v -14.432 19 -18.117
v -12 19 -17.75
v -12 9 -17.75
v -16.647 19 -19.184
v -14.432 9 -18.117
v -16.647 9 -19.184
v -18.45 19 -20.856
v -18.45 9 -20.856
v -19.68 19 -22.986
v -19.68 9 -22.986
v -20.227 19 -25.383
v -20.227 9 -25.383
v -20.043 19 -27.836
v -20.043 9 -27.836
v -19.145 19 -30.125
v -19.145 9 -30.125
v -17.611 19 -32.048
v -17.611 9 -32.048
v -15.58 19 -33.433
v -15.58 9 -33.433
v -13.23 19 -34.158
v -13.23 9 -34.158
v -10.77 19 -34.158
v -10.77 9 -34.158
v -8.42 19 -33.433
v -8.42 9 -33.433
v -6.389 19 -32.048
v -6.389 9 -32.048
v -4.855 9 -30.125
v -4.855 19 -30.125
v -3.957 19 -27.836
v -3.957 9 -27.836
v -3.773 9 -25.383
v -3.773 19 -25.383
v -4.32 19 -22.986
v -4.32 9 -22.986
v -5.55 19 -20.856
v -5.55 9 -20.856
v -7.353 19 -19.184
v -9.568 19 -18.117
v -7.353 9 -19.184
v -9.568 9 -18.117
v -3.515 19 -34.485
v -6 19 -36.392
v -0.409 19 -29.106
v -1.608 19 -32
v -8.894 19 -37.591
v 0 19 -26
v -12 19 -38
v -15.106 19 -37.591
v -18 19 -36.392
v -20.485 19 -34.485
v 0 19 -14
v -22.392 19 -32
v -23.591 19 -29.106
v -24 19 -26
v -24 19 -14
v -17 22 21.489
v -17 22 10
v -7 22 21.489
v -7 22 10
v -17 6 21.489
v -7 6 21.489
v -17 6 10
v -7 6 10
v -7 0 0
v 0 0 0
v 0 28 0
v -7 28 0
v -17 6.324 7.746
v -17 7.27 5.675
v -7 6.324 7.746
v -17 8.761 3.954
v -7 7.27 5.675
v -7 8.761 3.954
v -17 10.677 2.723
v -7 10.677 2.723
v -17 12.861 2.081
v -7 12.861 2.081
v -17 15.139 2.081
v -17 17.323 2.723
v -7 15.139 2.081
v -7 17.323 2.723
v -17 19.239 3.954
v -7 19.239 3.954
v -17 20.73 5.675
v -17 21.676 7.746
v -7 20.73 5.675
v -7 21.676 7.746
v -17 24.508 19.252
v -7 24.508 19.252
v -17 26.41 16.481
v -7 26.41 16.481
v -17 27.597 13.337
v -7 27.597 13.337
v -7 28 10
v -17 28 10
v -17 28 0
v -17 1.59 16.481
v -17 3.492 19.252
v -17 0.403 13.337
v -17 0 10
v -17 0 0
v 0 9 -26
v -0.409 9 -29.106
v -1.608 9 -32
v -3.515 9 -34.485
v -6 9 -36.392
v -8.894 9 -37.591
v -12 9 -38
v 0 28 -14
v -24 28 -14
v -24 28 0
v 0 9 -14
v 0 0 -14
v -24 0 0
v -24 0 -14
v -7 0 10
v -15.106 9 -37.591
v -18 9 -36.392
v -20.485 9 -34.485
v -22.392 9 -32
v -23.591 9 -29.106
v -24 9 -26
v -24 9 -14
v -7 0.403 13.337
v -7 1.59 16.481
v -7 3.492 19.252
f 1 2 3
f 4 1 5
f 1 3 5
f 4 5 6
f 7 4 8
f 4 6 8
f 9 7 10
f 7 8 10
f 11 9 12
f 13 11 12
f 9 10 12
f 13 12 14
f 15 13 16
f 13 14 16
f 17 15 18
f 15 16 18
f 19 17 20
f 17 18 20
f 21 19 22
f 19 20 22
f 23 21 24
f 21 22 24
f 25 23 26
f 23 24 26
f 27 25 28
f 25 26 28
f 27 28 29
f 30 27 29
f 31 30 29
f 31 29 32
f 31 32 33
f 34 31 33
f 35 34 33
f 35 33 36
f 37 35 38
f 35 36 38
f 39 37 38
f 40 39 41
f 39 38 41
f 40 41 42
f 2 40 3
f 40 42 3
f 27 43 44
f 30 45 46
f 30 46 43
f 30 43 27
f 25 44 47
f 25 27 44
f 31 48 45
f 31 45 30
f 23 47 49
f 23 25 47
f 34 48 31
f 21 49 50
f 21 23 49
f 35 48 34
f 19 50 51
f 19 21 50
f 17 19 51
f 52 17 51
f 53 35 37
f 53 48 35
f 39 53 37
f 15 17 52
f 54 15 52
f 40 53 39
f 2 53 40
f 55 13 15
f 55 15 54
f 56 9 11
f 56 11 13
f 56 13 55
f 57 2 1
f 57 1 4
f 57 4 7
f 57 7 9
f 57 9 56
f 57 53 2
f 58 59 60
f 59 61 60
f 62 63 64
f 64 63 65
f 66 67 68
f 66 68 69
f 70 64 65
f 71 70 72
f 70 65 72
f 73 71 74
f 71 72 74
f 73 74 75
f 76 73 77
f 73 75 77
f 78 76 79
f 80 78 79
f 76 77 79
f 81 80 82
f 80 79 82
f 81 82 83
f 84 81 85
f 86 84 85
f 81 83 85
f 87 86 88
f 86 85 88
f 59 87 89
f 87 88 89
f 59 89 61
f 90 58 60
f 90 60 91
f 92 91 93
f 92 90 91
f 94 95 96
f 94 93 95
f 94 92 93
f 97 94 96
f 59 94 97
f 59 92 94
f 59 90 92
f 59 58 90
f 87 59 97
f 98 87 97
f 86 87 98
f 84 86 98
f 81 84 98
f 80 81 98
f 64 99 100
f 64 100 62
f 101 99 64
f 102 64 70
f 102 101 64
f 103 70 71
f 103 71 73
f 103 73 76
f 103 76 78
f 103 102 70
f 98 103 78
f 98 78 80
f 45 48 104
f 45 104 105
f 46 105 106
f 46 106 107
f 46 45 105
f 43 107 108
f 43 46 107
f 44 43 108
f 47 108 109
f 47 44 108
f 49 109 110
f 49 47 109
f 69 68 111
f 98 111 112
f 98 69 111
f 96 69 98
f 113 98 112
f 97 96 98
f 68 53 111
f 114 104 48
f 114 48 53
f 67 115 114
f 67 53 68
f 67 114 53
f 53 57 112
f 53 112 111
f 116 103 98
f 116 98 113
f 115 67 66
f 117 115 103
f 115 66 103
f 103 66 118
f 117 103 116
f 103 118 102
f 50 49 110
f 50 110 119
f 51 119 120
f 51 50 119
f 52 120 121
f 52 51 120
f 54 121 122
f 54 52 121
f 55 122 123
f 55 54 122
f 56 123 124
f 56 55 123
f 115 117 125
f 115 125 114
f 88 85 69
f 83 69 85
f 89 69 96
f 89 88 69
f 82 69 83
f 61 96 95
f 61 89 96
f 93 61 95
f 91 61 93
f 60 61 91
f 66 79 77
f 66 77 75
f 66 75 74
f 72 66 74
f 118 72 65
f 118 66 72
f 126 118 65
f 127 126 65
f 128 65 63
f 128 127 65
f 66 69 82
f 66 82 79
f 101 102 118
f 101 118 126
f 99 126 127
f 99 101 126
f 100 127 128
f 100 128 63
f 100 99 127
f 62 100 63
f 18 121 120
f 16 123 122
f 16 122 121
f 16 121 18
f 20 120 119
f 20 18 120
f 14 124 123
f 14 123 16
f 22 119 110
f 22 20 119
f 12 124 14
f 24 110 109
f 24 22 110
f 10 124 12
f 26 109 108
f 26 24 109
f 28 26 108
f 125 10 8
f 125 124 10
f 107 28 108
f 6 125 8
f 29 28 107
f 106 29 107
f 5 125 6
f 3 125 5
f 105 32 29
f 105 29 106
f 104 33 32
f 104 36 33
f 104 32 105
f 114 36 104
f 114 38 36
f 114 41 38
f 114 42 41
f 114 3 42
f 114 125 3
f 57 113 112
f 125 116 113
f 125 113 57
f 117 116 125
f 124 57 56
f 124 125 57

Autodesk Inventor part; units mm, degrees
ref_plane "YZ Plane" through (0, 0, 0) normal (1, 0, 0) x (0, 1, 0)
ref_plane "XZ Plane" through (0, 0, 0) normal (0, 1, 0) x (-1, 0, 0)
ref_plane "XY Plane" through (0, 0, 0) normal (0, 0, 1) x (1, 0, 0)
sketch "Szkic1" plane through (0, 0, 0) normal (0, 1, 0) x (-1, 0, 0)
  line L0 (0, 0) -> (24, 0)
  line L1 (24, 0) -> (24, -14)
  line L2 (24, -14) -> (0, -14)
  line L3 (0, -14) -> (0, 0)
  line L4 (17, 0) -> (7, 0)
  line L5 (7, 0) -> (7, 24)
  line L6 (7, 24) -> (17, 24)
  line L7 (17, 24) -> (17, 0)
  point P0 (7, 0)
  dimension "d0" = 24
  dimension "d1" = 14
  dimension "d2" = 10
  dimension "d3" = 24
  dimension "d4" = 7
extrude "Wyciągnięcie proste1" add sketch "Szkic1" along normal blind 28
fillet "Zaokrąglenie1" radius 14 2 edges at (-12, 28, 24) (-12, 0, 24)
sketch "Szkic2" plane through (-7, 0, 0) normal (1, 0, 0) x (0, 0, -1)
  circle A0 centre (-10, 14) radius 8
  line L0 (-10, 0) -> (0, 0) projected
  line L1 (-10, 22) -> (-24, 22)
  line L2 (-24, 22) -> (-24, 6)
  line L3 (-24, 6) -> (-10, 6)
  line L4 (-10, 6) -> (-10, 22)
  dimension "d8" = 16
  dimension "d9" = 14
extrude "Wyciągnięcie proste2" cut sketch "Szkic2" against normal through all
sketch "Szkic3" plane through (0, 0, -14) normal (0, 0, -1) x (-1, 0, 0)
  line L0 (0, 0) -> (0, 28) projected
  line L1 (24, 0) -> (24, 28) projected
  line L2 (0, 19) -> (24, 19)
  line L3 (24, 19) -> (24, 9)
  line L4 (24, 9) -> (0, 9)
  line L5 (0, 9) -> (0, 19)
  line L6 (0, 28) -> (24, 28) projected
  line L7 (0, 0) -> (24, 0) projected
  point P0 (0, 9)
  dimension "d12" = 9
  dimension "d13" = 9
extrude "Wyciągnięcie proste3" add sketch "Szkic3" along normal blind 24 contours L0 L2 L1 L4
full round fillet "Zaokrąglenie pełne1" first side at (0, 12.3333, -4.6667) centre faces at (-8, 15.6667, -38) second side at (-24, 12.3333, -4.6667)
sketch "Szkic4" plane through (-24, 19, -14) normal (0, 1, 0) x (1, 0, 0)
  arc A0 (24, 12) -> (0, 12) centre (12, 12) ccw projected
  point P0 (24, -14)
hole "Otwór1" at (-12, 19, -26) direction (0, -1, 0) diameter 16.5 end through all
